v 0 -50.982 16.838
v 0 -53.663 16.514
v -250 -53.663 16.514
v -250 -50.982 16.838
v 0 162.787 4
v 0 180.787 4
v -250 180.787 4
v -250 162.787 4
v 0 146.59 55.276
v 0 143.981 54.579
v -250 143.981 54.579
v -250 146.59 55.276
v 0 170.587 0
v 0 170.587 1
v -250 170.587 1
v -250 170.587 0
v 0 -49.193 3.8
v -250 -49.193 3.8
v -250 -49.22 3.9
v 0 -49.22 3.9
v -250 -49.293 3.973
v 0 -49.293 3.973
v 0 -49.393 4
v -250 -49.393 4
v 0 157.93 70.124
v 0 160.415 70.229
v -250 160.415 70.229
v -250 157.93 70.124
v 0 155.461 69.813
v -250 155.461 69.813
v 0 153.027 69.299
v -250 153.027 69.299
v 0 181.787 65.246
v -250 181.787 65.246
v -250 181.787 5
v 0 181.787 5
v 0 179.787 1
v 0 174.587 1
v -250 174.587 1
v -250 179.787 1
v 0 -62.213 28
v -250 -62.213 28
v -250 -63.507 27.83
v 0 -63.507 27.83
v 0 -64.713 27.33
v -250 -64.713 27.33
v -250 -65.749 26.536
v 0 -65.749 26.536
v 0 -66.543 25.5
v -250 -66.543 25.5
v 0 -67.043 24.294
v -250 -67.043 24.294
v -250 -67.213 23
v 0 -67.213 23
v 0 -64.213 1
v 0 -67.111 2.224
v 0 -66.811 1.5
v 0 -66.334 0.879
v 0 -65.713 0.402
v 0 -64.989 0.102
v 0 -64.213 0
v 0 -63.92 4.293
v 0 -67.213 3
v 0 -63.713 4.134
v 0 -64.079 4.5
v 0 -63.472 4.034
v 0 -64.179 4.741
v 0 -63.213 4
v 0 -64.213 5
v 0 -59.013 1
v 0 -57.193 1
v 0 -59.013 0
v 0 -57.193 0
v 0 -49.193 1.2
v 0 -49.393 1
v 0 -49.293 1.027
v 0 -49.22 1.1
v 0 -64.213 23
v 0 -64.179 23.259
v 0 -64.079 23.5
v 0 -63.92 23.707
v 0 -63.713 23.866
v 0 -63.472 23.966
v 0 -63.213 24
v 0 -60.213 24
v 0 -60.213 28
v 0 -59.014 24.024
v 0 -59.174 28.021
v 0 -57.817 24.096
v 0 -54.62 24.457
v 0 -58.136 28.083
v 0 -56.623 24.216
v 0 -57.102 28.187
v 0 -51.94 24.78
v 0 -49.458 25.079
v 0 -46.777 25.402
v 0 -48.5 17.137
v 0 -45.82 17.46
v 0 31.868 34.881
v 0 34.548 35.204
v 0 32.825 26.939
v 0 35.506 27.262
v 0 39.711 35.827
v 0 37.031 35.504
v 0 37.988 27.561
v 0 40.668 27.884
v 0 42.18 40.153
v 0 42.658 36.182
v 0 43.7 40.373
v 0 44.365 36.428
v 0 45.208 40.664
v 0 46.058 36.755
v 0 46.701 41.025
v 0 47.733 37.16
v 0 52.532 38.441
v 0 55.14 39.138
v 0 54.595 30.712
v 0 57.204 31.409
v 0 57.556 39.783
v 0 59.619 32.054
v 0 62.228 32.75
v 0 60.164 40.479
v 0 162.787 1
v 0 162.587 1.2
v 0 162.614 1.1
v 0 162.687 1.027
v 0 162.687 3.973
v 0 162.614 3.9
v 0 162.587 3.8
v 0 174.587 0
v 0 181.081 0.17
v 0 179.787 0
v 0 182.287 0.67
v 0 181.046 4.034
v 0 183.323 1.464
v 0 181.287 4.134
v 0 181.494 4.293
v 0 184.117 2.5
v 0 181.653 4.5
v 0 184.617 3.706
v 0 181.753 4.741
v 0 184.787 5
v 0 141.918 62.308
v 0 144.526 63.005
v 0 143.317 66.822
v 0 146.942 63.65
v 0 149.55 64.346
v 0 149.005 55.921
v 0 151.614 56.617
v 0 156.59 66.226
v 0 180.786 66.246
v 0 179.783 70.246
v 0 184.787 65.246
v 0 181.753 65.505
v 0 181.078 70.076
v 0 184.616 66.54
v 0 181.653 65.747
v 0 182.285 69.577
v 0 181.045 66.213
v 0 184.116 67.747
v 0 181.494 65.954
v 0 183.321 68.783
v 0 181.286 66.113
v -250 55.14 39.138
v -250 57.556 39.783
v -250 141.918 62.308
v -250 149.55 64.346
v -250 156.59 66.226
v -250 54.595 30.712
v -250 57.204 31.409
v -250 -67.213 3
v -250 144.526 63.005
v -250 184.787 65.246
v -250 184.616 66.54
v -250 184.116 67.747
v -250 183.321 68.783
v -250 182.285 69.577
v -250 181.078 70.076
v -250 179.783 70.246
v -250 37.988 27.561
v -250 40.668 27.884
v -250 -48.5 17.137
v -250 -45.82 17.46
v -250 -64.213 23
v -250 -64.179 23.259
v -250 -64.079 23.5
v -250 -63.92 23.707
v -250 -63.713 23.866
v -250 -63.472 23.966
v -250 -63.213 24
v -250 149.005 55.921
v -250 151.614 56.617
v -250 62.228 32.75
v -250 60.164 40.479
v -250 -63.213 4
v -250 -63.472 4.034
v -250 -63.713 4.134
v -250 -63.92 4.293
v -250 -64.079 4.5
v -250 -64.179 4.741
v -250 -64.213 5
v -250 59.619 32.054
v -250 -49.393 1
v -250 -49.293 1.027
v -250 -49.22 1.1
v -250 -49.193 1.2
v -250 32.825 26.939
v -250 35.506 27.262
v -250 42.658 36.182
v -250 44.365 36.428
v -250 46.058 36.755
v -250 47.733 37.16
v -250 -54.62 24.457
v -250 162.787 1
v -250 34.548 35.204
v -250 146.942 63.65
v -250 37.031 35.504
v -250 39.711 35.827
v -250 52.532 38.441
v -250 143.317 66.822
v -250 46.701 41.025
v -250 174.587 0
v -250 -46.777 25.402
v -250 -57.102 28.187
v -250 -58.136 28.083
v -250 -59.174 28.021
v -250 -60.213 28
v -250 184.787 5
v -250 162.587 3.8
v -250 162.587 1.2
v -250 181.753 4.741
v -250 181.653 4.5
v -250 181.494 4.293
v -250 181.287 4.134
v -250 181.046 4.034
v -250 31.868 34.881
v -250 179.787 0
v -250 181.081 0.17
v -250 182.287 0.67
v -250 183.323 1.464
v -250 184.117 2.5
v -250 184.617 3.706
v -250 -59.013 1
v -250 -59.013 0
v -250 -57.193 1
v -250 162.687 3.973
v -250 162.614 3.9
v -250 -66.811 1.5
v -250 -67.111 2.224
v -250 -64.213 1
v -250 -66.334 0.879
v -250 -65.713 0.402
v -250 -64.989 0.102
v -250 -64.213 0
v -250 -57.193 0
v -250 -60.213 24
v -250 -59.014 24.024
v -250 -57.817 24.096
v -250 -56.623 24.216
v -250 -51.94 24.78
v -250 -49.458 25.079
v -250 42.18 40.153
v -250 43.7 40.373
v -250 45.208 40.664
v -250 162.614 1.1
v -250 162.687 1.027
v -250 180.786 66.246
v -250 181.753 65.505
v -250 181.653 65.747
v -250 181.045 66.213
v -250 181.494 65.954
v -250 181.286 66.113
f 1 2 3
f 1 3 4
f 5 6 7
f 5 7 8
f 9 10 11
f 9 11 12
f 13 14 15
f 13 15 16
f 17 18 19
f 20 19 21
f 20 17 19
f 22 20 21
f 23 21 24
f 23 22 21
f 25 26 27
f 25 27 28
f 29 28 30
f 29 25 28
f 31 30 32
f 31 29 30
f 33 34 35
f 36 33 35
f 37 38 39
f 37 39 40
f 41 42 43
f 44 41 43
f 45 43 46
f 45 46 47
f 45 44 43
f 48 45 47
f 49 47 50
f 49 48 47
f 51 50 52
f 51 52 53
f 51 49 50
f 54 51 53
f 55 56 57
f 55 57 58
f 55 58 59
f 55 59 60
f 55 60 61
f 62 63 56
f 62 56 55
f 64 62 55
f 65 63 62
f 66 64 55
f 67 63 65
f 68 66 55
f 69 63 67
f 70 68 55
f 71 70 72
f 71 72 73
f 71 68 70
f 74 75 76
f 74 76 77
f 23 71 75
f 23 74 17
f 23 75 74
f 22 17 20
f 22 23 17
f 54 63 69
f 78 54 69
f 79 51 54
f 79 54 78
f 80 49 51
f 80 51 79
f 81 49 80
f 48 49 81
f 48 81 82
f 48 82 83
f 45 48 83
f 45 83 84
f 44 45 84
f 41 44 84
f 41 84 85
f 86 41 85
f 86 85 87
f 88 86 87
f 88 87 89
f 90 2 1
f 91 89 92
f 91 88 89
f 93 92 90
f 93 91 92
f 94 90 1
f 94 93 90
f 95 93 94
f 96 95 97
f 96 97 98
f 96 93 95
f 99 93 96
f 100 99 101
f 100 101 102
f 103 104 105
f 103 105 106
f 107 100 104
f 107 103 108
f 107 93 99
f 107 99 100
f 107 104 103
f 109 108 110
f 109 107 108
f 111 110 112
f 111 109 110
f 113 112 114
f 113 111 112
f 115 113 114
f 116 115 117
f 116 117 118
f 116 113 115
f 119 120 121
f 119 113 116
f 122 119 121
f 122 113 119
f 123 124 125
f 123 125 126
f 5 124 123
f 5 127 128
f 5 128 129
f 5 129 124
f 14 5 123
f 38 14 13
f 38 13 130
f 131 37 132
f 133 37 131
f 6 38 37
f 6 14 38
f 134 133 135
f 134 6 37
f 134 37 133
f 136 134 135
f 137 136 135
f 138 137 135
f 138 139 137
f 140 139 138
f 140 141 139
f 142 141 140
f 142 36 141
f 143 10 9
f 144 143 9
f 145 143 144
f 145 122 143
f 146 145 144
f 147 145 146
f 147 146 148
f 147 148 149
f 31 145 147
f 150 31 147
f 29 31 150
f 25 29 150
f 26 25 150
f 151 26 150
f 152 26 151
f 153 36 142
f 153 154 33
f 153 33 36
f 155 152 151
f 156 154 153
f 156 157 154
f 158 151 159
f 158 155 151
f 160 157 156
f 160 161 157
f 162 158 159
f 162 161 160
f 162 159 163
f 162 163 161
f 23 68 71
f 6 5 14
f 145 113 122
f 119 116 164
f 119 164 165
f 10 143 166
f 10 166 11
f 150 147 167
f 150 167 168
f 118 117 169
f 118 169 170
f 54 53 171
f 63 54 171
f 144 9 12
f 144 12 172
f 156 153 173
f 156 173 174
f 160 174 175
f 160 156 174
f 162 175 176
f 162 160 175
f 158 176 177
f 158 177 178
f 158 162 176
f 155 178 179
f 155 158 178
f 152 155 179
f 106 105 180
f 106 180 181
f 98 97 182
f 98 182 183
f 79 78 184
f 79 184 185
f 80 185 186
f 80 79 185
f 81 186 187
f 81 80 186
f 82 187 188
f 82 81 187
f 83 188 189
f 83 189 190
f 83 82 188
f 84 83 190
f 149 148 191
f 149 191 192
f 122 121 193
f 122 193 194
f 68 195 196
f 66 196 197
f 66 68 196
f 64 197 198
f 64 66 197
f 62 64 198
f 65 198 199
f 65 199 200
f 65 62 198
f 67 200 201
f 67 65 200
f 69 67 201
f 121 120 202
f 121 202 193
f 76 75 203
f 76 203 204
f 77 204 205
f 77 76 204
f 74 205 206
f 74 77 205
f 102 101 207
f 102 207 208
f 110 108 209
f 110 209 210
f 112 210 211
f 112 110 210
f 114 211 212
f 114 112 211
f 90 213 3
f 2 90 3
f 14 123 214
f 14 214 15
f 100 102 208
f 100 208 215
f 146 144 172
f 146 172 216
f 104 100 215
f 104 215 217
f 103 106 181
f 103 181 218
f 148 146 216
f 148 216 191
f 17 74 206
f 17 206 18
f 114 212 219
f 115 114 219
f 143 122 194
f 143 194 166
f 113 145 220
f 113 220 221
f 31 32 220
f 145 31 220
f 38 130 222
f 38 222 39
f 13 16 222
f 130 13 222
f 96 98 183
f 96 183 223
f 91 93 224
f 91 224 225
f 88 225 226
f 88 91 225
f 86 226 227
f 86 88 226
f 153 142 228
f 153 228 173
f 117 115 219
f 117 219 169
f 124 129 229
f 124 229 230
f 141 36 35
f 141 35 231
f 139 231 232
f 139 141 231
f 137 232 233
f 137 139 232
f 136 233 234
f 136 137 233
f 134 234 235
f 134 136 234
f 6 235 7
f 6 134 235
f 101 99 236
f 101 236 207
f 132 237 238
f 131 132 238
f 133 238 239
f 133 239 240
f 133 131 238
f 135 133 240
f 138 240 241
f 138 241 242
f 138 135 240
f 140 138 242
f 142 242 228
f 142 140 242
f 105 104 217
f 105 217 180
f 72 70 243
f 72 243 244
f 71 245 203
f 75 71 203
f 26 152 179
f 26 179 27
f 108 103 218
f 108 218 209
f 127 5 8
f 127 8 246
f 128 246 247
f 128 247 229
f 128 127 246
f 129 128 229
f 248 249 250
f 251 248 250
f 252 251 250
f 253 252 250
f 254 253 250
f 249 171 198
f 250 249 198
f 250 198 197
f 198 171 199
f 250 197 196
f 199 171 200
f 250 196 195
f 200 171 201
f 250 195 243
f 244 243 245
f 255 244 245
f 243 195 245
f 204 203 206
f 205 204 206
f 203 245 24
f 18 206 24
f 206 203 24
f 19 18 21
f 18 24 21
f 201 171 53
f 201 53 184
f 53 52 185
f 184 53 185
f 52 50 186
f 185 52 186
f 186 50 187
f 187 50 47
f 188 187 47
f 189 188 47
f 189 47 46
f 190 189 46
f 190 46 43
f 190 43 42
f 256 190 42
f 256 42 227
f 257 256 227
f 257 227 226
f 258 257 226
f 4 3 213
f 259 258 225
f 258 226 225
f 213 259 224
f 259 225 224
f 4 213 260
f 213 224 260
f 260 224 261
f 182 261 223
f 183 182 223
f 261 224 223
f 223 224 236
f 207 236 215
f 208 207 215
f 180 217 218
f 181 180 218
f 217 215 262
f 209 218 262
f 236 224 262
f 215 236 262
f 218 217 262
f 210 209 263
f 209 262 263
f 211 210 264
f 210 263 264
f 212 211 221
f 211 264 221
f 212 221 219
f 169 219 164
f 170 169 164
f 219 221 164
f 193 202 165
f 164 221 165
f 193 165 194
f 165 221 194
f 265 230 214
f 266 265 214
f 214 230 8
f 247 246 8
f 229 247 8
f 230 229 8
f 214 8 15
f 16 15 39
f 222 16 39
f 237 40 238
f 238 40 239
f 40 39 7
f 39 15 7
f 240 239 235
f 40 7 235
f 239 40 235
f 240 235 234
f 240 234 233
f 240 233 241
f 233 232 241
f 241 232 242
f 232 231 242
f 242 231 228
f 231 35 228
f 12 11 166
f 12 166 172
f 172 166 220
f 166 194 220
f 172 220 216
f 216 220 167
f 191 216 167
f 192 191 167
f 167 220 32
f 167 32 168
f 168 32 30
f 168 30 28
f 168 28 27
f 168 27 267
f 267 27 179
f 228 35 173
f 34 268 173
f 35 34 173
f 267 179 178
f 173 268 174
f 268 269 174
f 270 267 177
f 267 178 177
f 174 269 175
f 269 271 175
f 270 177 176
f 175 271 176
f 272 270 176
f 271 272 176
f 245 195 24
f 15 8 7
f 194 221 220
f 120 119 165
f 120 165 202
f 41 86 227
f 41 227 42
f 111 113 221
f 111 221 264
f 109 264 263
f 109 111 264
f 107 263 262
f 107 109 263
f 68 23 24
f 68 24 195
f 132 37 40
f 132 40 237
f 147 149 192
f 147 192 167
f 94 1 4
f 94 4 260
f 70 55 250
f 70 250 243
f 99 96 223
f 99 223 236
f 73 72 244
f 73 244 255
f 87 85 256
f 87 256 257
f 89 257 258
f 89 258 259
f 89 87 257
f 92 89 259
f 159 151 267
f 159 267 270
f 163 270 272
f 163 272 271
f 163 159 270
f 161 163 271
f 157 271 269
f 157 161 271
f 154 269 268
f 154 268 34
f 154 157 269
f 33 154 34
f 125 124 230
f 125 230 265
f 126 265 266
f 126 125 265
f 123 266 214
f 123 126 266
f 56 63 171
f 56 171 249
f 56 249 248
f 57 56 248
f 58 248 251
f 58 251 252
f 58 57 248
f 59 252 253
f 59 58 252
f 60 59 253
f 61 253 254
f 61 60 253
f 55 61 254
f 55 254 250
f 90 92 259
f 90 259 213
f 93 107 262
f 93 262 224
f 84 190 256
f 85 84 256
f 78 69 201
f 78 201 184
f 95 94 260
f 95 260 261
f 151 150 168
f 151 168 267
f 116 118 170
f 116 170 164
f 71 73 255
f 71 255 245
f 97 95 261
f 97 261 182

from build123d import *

# Parameters (mm, degrees)
F1_DEPTH = 250


with BuildPart() as f1:
    # F0 (on Right) → F1 (new body)
    with BuildSketch(Plane.YZ):
        with BuildLine():
            Line((-67.213031, 23), (-67.213031, 3))
            ThreePointArc((-67.213031, 3), (-66.334352, 0.87868), (-64.213031, 0))
            Line((-64.213031, 0), (-64.213031, 1))
            Line((-64.213031, 1), (-59.013031, 1))
            Line((-59.013031, 1), (-59.013031, 0))
            Line((-59.013031, 0), (-57.193299, 0))
            Line((-57.193299, 0), (-57.193299, 1))
            Line((-57.193299, 1), (-49.393299, 1))
            ThreePointArc((-49.393299, 1), (-49.251877, 1.058579), (-49.193299, 1.2))
            Line((-49.193299, 1.2), (-49.193299, 3.8))
            ThreePointArc((-49.193299, 3.8), (-49.251877, 3.941421), (-49.393299, 4))
            Line((-49.393299, 4), (-63.213031, 4))
            ThreePointArc((-63.213031, 4), (-63.920138, 4.292893), (-64.213031, 5))
            Line((-64.213031, 5), (-64.213031, 23))
            ThreePointArc((-64.213031, 23), (-63.920138, 23.707107), (-63.213031, 24))
            Line((-63.213031, 24), (-60.213031, 24))
            ThreePointArc((-60.213031, 24), (-58.414842, 24.05394), (-56.623119, 24.215566))
            Line((-56.623119, 24.215566), (-54.620346, 24.456959))
            Line((-54.620346, 24.456959), (-51.939747, 24.780052))
            Line((-51.939747, 24.780052), (-49.457711, 25.079211))
            Line((-49.457711, 25.079211), (-46.777112, 25.402303))
            Line((-46.777112, 25.402303), (31.867868, 34.881367))
            Line((31.867868, 34.881367), (34.548467, 35.204459))
            Line((34.548467, 35.204459), (37.030503, 35.503618))
            Line((37.030503, 35.503618), (39.711102, 35.82671))
            Line((39.711102, 35.82671), (42.658329, 36.181939))
            ThreePointArc((42.658329, 36.181939), (45.213023, 36.581626), (47.733225, 37.160242))
            Line((47.733225, 37.160242), (52.531631, 38.441465))
            Line((52.531631, 38.441465), (55.140242, 39.13799))
            Line((55.140242, 39.13799), (57.555623, 39.782921))
            Line((57.555623, 39.782921), (60.164234, 40.479447))
            Line((60.164234, 40.479447), (141.917559, 62.308406))
            Line((141.917559, 62.308406), (144.52617, 63.004931))
            Line((144.52617, 63.004931), (146.941551, 63.649862))
            Line((146.941551, 63.649862), (149.550162, 64.346387))
            Line((149.550162, 64.346387), (156.589742, 66.226026))
            Line((156.589742, 66.226026), (180.786126, 66.246425))
            ThreePointArc((180.786126, 66.246425), (181.493777, 65.953831), (181.786969, 65.246426))
            Line((181.786969, 65.246426), (181.786969, 5))
            ThreePointArc((181.786969, 5), (181.494075, 4.292893), (180.786969, 4))
            Line((180.786969, 4), (162.786969, 4))
            ThreePointArc((162.786969, 4), (162.645547, 3.941421), (162.586969, 3.8))
            Line((162.586969, 3.8), (162.586969, 1.2))
            ThreePointArc((162.586969, 1.2), (162.645547, 1.058579), (162.786969, 1))
            Line((162.786969, 1), (170.586969, 1))
            Line((170.586969, 1), (170.586969, 0))
            Line((170.586969, 0), (174.586969, 0))
            Line((174.586969, 0), (174.586969, 1))
            Line((174.586969, 1), (179.786969, 1))
            Line((179.786969, 1), (179.786969, 0))
            ThreePointArc((179.786969, 0), (183.322503, 1.464466), (184.786969, 5))
            Line((184.786969, 5), (184.786969, 65.245583))
            ThreePointArc((184.786969, 65.245583), (183.321012, 68.782607), (179.782753, 70.245581))
            Line((179.782753, 70.245581), (160.415484, 70.229253))
            ThreePointArc((160.415484, 70.229253), (156.692023, 69.994123), (153.02654, 69.298648))
            Line((153.02654, 69.298648), (143.316564, 66.822088))
            Line((143.316564, 66.822088), (46.701335, 41.024851))
            ThreePointArc((46.701335, 41.024851), (44.45587, 40.509313), (42.179674, 40.153197))
            Line((42.179674, 40.153197), (-57.101774, 28.186824))
            ThreePointArc((-57.101774, 28.186824), (-58.654601, 28.046748), (-60.213031, 28))
            Line((-60.213031, 28), (-62.213031, 28))
            ThreePointArc((-62.213031, 28), (-65.748565, 26.535534), (-67.213031, 23))
        make_face()
        Polygon((-51.939747, 24.780052), (-54.620346, 24.456959), (-53.663036, 16.514444), (-50.982437, 16.837536), align=None)
        Polygon((-46.777112, 25.402303), (-49.457711, 25.079211), (-48.500401, 17.136695), (-45.819802, 17.459787), align=None)
        Polygon((34.548467, 35.204459), (31.867868, 34.881367), (32.825178, 26.938851), (35.505777, 27.261943), align=None)
        Polygon((39.711102, 35.82671), (37.030503, 35.503618), (37.987813, 27.561102), (40.668412, 27.884194), align=None)
        Polygon((55.140242, 39.13799), (52.531631, 38.441465), (54.59541, 30.712247), (57.204021, 31.408772), align=None)
        Polygon((151.613941, 56.617169), (149.550162, 64.346387), (146.941551, 63.649862), (149.00533, 55.920644), align=None)
        Polygon((60.164234, 40.479447), (57.555623, 39.782921), (59.619402, 32.053703), (62.228013, 32.750228), align=None)
        Polygon((146.589949, 55.275713), (144.52617, 63.004931), (141.917559, 62.308406), (143.981338, 54.579187), align=None)
    extrude(amount=-F1_DEPTH)


solid = f1.part
